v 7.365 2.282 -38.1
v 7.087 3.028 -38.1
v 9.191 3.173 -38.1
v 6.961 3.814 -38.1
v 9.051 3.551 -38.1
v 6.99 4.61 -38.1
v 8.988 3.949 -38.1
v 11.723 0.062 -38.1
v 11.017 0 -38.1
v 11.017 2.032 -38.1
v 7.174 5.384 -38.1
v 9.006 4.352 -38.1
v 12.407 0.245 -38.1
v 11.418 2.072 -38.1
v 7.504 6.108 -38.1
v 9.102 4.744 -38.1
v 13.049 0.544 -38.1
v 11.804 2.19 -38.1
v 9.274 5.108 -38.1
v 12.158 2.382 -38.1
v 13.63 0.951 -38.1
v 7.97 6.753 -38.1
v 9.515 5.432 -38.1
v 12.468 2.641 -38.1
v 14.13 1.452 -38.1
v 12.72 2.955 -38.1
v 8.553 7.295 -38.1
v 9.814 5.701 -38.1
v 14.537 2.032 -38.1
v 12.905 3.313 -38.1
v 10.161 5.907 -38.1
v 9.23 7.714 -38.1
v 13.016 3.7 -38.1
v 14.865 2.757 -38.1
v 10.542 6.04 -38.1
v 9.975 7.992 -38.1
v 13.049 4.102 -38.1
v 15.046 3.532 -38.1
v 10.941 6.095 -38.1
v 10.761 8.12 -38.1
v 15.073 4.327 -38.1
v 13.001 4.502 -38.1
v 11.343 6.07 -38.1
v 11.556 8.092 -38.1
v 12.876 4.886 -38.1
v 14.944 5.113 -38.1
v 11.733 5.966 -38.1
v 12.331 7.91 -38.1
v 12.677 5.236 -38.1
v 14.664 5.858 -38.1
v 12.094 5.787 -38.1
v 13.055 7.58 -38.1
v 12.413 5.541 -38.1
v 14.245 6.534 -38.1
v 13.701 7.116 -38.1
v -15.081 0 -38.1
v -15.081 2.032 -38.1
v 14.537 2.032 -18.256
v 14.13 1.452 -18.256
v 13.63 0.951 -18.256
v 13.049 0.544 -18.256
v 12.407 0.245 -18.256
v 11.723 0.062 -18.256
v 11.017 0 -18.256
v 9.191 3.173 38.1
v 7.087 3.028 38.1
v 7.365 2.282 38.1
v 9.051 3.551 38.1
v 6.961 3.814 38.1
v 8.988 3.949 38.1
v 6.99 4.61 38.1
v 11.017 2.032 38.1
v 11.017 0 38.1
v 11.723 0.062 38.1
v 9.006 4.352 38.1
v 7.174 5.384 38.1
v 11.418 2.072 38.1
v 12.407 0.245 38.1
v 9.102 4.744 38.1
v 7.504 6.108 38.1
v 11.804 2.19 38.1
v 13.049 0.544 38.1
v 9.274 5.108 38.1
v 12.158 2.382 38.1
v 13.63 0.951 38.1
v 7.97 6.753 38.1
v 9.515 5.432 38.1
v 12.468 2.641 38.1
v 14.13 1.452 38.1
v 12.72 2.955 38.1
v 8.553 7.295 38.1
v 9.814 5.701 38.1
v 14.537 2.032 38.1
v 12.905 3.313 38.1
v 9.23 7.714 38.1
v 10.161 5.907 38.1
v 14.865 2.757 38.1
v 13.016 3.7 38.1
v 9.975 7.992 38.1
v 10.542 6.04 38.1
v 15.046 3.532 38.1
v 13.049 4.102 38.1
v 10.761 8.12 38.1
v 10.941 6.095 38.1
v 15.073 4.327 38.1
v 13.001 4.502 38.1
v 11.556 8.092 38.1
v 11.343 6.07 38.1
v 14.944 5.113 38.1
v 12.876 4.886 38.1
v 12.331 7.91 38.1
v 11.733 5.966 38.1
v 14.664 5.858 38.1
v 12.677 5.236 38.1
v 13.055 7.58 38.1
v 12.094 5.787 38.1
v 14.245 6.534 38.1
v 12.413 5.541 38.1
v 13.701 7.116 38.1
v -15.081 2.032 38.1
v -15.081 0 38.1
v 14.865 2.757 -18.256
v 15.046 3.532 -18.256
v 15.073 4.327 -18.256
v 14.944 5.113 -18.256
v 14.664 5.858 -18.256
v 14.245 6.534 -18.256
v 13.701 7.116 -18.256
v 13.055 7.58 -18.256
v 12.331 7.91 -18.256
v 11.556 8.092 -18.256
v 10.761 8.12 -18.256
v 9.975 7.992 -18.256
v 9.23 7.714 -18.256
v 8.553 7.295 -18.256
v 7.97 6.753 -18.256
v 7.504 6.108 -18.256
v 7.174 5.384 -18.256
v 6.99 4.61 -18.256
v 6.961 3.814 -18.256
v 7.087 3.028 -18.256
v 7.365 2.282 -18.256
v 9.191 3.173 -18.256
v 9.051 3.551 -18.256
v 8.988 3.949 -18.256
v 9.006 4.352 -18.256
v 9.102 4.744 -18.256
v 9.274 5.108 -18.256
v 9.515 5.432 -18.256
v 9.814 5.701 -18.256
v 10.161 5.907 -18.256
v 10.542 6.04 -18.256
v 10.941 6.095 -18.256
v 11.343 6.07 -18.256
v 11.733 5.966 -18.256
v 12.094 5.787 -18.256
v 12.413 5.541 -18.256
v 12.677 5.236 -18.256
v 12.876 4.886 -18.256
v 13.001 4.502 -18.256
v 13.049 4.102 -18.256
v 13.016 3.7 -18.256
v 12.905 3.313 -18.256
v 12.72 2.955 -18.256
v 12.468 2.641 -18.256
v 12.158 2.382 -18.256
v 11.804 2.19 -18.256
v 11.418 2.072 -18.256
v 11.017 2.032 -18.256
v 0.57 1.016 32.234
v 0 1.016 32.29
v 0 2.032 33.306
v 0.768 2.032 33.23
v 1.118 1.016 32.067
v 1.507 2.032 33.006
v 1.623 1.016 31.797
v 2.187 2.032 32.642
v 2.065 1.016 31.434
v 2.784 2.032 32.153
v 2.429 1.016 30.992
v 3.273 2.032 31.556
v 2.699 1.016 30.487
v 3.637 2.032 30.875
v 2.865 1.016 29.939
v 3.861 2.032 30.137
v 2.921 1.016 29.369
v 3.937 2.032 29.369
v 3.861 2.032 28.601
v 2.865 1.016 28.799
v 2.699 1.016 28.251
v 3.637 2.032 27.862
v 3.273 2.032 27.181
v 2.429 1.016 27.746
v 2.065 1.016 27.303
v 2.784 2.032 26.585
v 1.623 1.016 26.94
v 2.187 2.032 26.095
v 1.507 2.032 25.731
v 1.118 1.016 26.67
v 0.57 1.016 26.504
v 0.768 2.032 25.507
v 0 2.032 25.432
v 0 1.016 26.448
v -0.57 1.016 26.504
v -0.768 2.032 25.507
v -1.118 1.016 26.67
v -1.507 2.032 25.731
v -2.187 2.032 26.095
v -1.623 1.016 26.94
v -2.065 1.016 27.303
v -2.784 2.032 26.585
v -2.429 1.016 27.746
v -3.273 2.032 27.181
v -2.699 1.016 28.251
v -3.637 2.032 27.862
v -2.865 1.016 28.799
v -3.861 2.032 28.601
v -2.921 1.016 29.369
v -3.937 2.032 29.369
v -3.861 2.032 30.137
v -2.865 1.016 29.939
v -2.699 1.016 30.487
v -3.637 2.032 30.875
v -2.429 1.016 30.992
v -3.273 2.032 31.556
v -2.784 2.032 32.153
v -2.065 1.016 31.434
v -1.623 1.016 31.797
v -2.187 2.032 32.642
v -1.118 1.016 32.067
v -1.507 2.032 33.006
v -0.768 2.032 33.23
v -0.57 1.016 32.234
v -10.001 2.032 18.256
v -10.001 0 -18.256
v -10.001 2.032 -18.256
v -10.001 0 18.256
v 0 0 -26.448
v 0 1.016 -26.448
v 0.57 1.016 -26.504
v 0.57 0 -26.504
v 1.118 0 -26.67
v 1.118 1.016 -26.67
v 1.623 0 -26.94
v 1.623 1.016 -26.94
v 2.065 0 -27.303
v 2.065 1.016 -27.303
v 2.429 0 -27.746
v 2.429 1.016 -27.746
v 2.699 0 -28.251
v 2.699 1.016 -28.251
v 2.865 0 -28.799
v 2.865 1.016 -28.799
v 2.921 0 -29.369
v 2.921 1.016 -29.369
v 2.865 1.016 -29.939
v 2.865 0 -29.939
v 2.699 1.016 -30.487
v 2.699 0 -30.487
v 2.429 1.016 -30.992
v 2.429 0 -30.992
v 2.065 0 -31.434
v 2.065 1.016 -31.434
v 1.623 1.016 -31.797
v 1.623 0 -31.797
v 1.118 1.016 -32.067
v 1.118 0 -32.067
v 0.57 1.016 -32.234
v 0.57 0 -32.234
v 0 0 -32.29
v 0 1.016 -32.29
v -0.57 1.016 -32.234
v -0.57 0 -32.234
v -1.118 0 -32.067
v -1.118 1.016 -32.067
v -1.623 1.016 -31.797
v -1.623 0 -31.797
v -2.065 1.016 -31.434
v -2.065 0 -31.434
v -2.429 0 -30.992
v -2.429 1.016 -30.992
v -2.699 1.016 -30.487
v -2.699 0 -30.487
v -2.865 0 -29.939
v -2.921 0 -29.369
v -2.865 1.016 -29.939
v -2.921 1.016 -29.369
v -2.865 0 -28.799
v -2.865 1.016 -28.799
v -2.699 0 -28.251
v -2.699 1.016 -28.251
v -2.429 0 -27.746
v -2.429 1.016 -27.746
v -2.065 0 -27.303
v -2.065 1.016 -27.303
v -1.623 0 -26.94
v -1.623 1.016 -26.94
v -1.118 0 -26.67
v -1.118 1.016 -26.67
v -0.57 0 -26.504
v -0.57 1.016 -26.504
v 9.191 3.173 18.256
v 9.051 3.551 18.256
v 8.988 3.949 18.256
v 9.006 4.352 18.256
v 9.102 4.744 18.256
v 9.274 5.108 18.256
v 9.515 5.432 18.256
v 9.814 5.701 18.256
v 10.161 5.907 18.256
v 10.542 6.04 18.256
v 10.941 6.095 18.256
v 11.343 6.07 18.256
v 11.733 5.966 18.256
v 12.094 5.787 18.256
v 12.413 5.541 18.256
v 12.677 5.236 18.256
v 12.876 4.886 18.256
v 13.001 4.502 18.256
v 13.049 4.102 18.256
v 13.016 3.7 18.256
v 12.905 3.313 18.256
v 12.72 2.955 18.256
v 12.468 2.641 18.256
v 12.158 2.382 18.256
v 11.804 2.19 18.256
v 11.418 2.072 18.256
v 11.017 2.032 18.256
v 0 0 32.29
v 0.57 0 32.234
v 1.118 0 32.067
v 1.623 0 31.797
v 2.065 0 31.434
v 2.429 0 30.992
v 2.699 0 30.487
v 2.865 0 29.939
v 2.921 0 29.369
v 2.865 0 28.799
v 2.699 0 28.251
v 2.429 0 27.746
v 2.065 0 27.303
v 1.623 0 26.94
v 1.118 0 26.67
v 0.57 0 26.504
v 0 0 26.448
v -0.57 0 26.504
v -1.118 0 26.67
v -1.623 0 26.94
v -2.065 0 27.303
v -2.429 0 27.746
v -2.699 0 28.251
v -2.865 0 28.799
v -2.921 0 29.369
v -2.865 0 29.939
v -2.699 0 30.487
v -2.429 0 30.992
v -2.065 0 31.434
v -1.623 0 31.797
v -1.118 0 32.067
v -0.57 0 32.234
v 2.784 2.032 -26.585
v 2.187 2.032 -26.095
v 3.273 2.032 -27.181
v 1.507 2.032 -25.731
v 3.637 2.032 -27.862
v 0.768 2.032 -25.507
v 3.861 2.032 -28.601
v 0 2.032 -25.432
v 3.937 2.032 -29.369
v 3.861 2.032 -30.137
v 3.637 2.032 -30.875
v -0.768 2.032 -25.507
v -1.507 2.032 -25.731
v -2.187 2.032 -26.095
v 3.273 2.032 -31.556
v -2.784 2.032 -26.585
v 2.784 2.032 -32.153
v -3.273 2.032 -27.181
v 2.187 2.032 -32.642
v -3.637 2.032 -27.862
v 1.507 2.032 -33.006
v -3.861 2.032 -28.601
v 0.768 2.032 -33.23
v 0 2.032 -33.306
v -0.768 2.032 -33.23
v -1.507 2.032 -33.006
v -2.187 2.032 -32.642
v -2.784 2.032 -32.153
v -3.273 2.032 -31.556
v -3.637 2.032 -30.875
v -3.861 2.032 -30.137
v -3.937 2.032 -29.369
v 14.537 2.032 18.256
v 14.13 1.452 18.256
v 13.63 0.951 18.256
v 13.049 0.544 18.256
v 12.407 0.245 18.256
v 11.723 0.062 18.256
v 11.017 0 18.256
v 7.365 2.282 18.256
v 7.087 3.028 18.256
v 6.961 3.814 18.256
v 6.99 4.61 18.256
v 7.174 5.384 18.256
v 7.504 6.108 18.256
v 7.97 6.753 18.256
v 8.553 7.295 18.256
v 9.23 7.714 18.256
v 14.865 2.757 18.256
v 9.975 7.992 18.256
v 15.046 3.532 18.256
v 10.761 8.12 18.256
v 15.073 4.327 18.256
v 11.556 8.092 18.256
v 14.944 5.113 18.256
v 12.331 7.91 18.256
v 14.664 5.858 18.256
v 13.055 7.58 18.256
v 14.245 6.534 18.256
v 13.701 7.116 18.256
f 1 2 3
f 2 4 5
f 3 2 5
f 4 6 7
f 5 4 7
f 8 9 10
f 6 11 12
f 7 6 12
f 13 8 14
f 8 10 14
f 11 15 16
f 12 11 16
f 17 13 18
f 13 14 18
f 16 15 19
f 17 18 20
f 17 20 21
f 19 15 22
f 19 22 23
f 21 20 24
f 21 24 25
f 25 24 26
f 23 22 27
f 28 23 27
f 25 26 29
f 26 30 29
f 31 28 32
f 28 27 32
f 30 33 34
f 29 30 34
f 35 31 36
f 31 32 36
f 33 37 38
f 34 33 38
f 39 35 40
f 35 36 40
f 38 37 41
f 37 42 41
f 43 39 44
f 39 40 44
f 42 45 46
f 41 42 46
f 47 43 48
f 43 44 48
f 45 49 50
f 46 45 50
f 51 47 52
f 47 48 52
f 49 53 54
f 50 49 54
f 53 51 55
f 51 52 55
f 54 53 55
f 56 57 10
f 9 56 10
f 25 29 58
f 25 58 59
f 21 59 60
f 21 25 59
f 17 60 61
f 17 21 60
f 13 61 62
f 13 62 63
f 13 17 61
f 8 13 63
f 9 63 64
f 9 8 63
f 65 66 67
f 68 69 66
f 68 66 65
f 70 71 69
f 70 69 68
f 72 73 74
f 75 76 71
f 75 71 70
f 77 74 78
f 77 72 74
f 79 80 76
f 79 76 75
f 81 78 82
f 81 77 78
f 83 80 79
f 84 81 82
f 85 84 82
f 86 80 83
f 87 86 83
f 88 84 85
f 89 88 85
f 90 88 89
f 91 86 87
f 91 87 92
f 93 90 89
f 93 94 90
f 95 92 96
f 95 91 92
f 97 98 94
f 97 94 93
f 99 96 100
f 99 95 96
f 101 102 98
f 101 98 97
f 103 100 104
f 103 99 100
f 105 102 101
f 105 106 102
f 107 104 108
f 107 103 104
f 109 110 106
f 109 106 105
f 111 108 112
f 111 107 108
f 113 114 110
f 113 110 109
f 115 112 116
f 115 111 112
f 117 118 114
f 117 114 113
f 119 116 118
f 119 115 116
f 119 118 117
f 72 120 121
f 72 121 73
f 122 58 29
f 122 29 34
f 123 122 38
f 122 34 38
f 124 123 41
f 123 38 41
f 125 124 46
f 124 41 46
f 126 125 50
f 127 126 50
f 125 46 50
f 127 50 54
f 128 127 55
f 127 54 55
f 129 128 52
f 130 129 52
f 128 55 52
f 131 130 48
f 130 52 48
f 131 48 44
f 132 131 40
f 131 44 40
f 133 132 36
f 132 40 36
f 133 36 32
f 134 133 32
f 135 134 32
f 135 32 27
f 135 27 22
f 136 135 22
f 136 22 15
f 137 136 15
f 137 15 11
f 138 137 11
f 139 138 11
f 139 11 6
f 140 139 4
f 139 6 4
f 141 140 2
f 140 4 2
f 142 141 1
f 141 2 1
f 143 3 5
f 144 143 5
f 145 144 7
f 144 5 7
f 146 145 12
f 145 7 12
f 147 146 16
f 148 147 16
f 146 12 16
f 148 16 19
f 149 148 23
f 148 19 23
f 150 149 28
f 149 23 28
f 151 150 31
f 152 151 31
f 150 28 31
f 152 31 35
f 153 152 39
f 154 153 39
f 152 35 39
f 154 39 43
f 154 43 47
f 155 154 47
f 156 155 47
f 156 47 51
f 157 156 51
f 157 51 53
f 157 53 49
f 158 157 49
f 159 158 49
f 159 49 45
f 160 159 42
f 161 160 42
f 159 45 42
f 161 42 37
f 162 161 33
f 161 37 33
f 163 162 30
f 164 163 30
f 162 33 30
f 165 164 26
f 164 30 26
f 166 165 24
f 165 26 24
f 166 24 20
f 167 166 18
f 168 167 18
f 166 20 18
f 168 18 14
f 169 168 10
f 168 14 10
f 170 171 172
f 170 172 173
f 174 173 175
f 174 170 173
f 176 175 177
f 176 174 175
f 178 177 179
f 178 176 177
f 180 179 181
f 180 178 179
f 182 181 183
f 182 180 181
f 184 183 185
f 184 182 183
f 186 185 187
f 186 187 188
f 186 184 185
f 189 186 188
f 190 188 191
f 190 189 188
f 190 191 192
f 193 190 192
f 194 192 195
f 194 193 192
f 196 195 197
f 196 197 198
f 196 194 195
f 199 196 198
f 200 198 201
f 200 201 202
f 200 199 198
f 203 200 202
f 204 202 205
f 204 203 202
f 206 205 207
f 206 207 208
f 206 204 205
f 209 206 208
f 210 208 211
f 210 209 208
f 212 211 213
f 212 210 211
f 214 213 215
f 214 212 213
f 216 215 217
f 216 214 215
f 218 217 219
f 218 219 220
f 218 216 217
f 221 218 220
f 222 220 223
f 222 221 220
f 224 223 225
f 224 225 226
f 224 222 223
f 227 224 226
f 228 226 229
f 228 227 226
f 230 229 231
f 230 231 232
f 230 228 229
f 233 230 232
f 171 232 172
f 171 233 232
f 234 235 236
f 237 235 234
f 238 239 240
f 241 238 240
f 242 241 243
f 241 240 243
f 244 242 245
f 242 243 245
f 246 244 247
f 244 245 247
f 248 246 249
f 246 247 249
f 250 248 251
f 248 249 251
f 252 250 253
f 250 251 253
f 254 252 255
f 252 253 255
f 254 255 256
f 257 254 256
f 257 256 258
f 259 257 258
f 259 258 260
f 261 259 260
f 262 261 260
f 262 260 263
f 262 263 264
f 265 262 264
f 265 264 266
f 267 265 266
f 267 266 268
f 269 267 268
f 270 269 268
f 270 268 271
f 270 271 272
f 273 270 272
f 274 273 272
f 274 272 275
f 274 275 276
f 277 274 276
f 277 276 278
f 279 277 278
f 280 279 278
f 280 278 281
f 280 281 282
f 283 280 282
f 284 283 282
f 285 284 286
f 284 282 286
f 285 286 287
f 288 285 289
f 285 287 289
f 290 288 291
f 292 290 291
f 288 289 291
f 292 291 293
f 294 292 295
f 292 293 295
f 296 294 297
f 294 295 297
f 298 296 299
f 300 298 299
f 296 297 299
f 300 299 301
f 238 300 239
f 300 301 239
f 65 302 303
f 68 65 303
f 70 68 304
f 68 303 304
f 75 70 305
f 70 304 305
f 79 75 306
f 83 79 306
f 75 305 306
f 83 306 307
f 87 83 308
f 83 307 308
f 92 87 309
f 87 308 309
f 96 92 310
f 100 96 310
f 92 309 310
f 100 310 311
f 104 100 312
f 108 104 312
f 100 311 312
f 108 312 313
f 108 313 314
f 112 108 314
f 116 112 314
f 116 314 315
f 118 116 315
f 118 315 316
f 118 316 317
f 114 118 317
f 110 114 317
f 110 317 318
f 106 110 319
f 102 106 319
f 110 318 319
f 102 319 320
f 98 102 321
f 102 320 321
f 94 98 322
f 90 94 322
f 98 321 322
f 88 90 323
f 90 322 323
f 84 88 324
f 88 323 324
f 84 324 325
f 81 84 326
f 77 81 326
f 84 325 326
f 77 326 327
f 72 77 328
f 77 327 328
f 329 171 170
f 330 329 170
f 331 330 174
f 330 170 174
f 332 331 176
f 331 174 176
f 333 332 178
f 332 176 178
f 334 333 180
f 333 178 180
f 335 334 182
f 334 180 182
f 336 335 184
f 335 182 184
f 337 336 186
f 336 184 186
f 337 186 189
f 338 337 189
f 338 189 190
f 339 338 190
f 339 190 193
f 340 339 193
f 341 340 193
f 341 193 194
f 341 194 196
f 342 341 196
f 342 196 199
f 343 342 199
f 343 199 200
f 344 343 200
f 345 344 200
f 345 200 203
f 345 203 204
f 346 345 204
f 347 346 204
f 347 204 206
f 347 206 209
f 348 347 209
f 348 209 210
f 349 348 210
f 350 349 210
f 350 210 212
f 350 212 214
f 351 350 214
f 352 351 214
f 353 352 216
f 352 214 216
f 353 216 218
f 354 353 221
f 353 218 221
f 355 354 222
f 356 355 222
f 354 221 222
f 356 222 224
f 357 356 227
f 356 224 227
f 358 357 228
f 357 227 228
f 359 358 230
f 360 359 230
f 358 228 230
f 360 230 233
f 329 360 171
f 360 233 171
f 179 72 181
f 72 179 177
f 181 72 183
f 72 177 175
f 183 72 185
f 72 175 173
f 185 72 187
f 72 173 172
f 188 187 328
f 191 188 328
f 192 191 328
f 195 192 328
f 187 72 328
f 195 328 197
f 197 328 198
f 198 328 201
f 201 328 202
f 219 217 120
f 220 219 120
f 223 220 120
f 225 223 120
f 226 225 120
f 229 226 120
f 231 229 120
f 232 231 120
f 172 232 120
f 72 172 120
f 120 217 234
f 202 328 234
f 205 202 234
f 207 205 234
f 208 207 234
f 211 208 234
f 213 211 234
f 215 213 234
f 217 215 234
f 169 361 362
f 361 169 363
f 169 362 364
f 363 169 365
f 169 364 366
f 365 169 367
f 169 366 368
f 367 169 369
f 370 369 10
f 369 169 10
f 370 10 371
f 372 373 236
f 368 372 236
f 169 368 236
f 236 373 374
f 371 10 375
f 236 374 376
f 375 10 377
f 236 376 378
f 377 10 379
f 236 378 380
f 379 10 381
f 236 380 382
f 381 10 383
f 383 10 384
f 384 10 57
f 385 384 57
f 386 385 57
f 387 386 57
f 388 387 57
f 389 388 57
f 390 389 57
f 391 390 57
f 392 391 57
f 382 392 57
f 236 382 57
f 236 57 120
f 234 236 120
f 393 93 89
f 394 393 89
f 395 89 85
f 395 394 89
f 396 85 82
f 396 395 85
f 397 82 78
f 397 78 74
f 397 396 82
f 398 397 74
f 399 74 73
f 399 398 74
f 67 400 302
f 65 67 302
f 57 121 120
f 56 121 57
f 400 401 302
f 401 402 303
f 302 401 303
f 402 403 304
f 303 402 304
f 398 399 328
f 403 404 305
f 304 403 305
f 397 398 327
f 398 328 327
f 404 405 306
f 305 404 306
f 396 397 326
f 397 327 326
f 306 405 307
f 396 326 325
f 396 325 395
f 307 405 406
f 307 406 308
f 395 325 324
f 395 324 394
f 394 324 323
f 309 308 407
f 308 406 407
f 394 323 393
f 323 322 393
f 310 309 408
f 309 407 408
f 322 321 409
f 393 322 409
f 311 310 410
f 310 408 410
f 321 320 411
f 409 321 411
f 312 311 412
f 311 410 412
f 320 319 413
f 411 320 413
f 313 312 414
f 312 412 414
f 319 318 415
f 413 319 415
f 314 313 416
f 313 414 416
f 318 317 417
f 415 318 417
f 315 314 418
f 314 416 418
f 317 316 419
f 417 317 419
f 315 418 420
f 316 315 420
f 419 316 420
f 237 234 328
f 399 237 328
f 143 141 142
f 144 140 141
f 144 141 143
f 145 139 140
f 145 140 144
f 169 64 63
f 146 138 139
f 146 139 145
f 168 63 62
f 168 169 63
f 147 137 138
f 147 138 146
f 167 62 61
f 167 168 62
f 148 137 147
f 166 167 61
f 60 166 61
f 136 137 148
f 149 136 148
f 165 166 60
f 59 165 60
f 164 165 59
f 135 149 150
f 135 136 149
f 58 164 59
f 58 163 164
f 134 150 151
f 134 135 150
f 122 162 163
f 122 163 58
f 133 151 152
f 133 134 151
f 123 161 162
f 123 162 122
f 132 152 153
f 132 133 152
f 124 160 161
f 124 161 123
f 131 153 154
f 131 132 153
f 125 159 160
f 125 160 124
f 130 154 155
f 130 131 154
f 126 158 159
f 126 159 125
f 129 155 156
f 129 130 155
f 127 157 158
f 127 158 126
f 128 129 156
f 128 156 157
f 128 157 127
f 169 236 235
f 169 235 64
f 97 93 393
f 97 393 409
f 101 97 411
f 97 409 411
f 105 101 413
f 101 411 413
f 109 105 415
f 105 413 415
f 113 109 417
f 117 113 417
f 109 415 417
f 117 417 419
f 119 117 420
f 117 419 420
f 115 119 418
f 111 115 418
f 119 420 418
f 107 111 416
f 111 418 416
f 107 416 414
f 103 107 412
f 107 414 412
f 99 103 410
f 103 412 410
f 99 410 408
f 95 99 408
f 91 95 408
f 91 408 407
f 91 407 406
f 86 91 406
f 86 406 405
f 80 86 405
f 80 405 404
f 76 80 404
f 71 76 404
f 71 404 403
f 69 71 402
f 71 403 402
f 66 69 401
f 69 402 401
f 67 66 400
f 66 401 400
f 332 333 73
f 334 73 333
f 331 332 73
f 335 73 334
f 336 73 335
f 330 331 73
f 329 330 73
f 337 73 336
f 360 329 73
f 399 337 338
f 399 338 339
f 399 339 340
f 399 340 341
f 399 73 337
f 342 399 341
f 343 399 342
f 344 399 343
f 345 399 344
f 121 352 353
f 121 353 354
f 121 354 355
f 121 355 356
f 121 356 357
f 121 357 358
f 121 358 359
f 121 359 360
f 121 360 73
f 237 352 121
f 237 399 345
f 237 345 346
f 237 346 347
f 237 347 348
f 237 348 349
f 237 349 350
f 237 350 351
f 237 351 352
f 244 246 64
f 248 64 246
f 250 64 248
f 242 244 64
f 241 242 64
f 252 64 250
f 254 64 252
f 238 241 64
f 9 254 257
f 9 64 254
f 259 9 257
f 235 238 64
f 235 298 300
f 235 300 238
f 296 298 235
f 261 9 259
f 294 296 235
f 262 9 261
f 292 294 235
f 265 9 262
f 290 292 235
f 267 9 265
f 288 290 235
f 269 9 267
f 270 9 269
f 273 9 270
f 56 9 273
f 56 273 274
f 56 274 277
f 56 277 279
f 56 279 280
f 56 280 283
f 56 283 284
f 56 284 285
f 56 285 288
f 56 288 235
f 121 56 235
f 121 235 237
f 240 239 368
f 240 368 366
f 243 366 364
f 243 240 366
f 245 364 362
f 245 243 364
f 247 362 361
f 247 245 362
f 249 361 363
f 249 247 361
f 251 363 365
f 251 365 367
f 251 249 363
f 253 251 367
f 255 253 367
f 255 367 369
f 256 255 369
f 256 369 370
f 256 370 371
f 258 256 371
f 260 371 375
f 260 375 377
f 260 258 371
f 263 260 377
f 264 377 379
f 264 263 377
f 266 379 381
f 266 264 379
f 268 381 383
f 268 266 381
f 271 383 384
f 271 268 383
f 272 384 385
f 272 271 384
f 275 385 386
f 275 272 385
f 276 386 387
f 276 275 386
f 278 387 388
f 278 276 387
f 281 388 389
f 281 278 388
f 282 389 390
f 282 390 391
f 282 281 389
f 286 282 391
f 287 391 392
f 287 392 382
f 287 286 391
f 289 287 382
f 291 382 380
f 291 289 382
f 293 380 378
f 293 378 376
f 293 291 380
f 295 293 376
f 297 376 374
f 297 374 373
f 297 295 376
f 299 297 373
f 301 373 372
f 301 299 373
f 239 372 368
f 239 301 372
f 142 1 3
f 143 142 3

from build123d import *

# Parameters (mm, degrees)
BASE_FLANGE1_DEPTH = 2.032
SKETCH6_R          = 2.921
CUT_EXTRUDE1_DEPTH = 2.54
HEM1_START         = -38.1
HEM1_DEPTH         = 76.2
HEM1_2_DEPTH       = 19.84375
HEM1_START_2       = 18.25625
HEM1_3_DEPTH       = 19.84375
CHAMFER2_SIZE      = 1.016


# Read off the part's stored shape, not the designer's step: Hem1
# Sheet-metal steps are written as plain solids
with BuildPart() as part:
    # Sketch1 → Base-Flange1 (new body)
    with BuildSketch(Plane(origin=(0, 0, 0), x_dir=(1, 0, 0), z_dir=(0, 1, 0))):
        Polygon((-15.08125, 38.1), (15.08125, 38.1), (15.08125, 18.25625), (-10.00125, 18.25625), (-10.00125, -18.25625), (15.08125, -18.25625), (15.08125, -38.1), (-15.08125, -38.1), align=None)
    extrude(amount=BASE_FLANGE1_DEPTH)

    # Sketch6 → Cut-Extrude1 (cut)
    with BuildSketch(Plane(origin=(0, 2.032, 0), x_dir=(1, 0, 0), z_dir=(0, 1, 0))):
        with Locations(Location((0, 29.36875, 0), (0, 0, 270))):
            Circle(SKETCH6_R)
        with Locations(Location((0, -29.36875, 0), (0, 0, 270))):
            Circle(SKETCH6_R)
    extrude(amount=-CUT_EXTRUDE1_DEPTH, mode=Mode.SUBTRACT)

    # Hem1 outline → Hem1 (cut)
    with BuildSketch(Plane.XY.offset(HEM1_START)):
        with BuildLine():
            Line((15.08125, 2.032), (14.536777241, 2.032))
            ThreePointArc((14.536777241, 2.032), (13.04925, 0.544472759), (11.01725, 0))
            Line((11.01725, 0), (15.08125, 0))
            Line((15.08125, 0), (15.08125, 2.032))
        make_face()
    extrude(amount=HEM1_DEPTH, mode=Mode.SUBTRACT)

    # Hem1 2 outline → Hem1 2 (add)
    with BuildSketch(Plane.XY.offset(HEM1_START)):
        with BuildLine():
            Line((7.364550996, 2.282459659), (9.190900498, 3.17322983))
            ThreePointArc((9.190900498, 3.17322983), (12.094045945, 5.787233731), (11.01725, 2.032))
            Line((11.01725, 2.032), (14.536777241, 2.032))
            ThreePointArc((14.536777241, 2.032), (11.159081554, 8.125524321), (7.364550996, 2.282459659))
        make_face()
    extrude(amount=HEM1_2_DEPTH)

    # Hem1 3 outline → Hem1 3 (add)
    with BuildSketch(Plane.XY.offset(HEM1_START_2)):
        with BuildLine():
            Line((7.364550996, 2.282459659), (9.190900498, 3.17322983))
            ThreePointArc((9.190900498, 3.17322983), (12.094045945, 5.787233731), (11.01725, 2.032))
            Line((11.01725, 2.032), (14.536777241, 2.032))
            ThreePointArc((14.536777241, 2.032), (11.159081554, 8.125524321), (7.364550996, 2.282459659))
        make_face()
    extrude(amount=HEM1_3_DEPTH)

    # Chamfer2
    chamfer2_edges = [part.edges().sort_by_distance(p)[0] for p in [
        (0, 2.032, -32.28975),
        (0, 2.032, 26.44775),
    ]]
    chamfer(chamfer2_edges, length=CHAMFER2_SIZE)


solid = part.part
